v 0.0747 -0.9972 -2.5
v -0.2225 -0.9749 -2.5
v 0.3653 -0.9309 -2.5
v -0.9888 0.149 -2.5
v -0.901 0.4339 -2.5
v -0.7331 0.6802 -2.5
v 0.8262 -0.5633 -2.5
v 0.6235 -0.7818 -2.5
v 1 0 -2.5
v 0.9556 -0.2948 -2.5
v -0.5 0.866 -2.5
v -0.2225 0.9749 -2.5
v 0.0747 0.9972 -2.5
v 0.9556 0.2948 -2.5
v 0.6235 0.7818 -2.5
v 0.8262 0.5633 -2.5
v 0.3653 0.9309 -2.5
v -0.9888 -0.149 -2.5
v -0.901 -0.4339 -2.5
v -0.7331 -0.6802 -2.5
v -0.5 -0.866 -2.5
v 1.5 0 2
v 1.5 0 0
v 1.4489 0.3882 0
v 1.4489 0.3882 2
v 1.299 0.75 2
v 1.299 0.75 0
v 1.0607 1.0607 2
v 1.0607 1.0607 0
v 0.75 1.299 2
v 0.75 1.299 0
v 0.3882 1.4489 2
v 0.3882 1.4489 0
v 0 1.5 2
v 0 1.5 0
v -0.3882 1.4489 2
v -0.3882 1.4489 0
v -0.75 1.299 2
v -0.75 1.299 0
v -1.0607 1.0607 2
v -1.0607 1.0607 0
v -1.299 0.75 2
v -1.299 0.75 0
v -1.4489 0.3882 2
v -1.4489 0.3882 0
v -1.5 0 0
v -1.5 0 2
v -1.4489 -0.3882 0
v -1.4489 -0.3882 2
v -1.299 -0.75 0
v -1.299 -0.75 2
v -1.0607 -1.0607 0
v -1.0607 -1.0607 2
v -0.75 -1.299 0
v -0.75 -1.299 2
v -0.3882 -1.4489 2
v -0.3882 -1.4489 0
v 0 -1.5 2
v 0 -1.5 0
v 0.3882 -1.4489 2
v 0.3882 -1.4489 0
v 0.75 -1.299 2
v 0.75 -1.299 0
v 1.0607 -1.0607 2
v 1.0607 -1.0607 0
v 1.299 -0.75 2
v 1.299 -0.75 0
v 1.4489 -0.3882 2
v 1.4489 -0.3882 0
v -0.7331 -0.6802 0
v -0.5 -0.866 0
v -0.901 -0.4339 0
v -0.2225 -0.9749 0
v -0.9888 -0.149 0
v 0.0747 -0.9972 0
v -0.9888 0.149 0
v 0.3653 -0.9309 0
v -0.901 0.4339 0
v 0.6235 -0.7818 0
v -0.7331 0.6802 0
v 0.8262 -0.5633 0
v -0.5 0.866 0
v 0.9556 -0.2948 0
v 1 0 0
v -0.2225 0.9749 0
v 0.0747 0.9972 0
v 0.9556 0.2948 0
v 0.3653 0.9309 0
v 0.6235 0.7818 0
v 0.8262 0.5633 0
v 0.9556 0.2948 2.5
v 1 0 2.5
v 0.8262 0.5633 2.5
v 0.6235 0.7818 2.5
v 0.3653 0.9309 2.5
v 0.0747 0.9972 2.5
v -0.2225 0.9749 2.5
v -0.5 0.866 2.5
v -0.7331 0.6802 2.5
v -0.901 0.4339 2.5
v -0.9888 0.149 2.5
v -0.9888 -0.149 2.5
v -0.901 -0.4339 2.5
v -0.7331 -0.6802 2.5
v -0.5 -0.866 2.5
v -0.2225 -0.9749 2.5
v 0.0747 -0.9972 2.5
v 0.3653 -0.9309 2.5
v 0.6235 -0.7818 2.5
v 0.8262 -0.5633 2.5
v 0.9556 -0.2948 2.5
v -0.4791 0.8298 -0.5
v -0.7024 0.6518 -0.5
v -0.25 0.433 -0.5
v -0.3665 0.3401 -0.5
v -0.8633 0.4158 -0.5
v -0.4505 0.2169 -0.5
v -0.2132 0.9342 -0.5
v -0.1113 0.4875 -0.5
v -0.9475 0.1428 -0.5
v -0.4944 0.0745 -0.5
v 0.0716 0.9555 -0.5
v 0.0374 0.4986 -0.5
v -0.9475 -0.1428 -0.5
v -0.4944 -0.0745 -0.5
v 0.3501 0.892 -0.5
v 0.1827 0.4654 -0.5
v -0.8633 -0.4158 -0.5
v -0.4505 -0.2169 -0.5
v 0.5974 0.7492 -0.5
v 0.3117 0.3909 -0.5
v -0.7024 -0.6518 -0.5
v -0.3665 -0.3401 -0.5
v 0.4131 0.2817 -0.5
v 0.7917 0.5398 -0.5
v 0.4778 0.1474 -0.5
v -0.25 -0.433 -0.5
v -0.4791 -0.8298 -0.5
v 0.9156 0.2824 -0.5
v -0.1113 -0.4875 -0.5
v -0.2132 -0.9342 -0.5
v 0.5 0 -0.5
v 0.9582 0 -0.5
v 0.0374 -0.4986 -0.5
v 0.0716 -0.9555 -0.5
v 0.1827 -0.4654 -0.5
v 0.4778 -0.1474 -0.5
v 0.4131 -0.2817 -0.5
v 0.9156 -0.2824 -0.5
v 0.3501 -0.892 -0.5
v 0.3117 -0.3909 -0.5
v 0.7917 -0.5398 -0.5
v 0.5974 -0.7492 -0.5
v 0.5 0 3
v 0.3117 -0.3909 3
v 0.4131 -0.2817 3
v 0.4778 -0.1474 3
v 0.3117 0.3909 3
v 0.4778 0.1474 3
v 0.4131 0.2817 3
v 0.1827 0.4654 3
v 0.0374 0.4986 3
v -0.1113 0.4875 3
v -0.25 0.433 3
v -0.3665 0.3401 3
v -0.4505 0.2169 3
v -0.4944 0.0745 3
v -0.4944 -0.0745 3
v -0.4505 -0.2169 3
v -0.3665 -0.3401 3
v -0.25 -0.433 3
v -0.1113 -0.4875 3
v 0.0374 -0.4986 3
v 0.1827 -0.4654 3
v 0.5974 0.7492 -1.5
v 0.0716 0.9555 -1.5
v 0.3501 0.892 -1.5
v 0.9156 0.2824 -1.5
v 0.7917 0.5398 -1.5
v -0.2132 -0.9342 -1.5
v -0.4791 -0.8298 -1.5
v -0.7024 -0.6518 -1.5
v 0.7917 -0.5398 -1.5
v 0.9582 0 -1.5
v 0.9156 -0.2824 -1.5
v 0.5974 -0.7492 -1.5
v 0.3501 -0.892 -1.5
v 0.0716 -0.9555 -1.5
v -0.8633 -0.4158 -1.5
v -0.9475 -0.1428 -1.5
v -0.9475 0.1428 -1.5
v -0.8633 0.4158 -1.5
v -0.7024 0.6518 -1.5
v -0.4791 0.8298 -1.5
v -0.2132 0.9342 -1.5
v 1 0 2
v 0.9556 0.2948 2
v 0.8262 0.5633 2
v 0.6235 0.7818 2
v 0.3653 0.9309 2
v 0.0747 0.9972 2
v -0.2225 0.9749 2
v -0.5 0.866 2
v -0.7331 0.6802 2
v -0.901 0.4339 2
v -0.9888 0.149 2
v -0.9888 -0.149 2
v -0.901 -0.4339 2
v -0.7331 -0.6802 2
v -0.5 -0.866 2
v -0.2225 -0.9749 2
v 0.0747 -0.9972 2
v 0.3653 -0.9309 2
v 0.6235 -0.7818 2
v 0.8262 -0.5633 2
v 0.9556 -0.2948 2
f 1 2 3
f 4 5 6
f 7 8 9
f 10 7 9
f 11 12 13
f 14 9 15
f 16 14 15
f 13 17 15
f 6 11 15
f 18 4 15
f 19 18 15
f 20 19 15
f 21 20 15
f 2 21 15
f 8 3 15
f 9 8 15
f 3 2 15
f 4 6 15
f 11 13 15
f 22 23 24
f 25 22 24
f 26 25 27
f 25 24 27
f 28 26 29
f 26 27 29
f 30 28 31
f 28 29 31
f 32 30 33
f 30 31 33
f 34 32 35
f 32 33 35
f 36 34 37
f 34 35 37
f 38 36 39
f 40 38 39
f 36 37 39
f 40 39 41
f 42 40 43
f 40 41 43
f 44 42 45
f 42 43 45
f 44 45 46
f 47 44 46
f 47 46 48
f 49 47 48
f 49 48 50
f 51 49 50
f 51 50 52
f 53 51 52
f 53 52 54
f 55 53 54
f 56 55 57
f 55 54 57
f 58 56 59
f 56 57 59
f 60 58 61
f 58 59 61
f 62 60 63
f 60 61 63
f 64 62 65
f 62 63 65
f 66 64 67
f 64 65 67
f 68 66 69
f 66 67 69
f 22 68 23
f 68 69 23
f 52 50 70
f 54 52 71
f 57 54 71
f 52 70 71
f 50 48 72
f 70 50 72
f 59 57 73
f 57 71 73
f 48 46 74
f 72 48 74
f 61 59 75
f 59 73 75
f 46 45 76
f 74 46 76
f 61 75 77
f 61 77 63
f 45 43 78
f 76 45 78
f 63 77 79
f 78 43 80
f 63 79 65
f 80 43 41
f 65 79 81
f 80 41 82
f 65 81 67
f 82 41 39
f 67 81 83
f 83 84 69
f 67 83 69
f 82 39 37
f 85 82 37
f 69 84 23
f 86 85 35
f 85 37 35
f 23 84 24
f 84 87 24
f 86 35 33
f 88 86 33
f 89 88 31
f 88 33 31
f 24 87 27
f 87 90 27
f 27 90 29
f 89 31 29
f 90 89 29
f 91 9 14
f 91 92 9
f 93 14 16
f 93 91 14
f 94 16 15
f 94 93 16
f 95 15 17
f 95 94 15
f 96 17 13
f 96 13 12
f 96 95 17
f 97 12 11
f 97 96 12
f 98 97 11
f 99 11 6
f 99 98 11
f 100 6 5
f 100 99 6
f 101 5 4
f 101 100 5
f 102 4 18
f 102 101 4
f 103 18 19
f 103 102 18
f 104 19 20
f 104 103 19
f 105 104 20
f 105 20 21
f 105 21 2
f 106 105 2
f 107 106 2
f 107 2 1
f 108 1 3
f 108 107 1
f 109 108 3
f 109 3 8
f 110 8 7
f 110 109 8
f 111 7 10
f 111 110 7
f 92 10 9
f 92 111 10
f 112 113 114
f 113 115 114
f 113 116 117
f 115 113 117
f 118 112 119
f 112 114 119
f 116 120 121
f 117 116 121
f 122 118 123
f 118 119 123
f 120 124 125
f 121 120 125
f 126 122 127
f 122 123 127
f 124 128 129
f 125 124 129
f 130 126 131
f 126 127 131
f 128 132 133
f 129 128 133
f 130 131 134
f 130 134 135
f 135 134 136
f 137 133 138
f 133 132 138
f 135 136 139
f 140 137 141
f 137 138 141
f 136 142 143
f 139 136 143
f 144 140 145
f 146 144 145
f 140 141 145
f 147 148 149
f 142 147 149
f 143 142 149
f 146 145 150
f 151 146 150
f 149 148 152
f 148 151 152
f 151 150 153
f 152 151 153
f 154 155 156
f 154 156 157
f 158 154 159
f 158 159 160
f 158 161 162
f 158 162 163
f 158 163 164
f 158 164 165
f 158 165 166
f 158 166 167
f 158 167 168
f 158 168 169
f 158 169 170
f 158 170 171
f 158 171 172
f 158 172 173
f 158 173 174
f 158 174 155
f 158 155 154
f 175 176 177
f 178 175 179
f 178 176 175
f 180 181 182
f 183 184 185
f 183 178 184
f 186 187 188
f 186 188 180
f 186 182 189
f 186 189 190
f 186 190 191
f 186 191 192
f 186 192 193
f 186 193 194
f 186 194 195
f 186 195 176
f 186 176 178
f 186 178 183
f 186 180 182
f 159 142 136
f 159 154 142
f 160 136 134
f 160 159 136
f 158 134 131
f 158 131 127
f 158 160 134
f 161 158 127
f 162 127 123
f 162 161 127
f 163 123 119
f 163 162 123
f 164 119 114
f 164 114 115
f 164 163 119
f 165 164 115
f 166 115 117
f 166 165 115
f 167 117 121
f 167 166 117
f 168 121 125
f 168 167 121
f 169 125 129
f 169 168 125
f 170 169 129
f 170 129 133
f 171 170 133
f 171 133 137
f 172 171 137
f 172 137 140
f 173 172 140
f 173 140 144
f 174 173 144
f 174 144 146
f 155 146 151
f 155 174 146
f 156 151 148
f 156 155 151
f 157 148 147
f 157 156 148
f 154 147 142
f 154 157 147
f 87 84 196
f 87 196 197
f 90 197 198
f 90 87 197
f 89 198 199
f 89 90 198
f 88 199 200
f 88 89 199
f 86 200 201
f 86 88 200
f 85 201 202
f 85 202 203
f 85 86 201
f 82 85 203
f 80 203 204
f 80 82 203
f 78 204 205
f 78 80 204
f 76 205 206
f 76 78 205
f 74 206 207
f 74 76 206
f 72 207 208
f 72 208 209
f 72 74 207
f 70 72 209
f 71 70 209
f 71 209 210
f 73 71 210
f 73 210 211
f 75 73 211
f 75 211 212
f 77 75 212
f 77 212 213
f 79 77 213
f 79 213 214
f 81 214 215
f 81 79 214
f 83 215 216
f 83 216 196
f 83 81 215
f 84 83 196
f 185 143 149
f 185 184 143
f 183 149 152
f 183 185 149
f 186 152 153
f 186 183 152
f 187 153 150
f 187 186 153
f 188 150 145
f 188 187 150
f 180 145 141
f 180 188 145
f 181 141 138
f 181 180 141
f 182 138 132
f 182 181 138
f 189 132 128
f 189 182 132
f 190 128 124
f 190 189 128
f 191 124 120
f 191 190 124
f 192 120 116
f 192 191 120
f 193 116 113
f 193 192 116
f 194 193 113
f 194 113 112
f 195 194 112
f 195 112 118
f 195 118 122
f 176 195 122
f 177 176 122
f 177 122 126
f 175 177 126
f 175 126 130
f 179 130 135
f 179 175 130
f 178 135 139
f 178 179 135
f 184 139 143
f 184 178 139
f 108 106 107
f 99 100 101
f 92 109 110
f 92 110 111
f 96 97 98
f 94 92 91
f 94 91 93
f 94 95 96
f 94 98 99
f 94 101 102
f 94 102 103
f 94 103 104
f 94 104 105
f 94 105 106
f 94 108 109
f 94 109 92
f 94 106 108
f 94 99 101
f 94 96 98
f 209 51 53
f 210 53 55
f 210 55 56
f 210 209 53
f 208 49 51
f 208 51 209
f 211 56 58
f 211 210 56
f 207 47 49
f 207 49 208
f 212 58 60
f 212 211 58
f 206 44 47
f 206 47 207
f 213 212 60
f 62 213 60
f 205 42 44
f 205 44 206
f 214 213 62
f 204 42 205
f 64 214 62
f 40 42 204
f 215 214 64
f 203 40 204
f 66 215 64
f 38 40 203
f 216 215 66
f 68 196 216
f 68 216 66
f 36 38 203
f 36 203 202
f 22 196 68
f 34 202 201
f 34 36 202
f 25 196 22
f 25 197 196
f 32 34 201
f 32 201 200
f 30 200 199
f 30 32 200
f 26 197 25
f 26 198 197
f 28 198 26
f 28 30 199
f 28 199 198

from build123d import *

# Parameters (mm, degrees)
F0_R     = 0.5
F1_DEPTH = 3
F0_R_2   = 1.5
F0_R_3   = 1
F2_DEPTH = 2
F3_DEPTH = 1
F4_R     = 0.958214
F5_DEPTH = 0.5
F6_R     = 1
F7_DEPTH = 2.5


with BuildPart() as f1:
    # F0 (on Top) → F1 (new body)
    with BuildSketch(Plane.XY):
        Circle(F0_R)
    extrude(amount=F1_DEPTH)

    # F0 (on Top) → F3 (join)
    with BuildSketch(Plane.XY):
        Circle(F0_R)
    extrude(amount=-F3_DEPTH)

    # F4 (on face) → F5 (join, symmetric)
    with BuildSketch(Plane(origin=(0, 0, -1), x_dir=(1, 0, 0), z_dir=(0, 0, -1))):
        Circle(F4_R)
    extrude(amount=F5_DEPTH, both=True)


with BuildPart() as f2:
    # F0 (on Top) → F2 (new body)
    with BuildSketch(Plane.XY):
        Circle(F0_R_2)
        Circle(F0_R_3, mode=Mode.SUBTRACT)
    extrude(amount=F2_DEPTH)


with BuildPart() as f7:
    # F6 (on Top) → F7 (new body, symmetric)
    with BuildSketch(Plane.XY):
        Circle(F6_R)
    extrude(amount=F7_DEPTH, both=True)


solid = Compound([f1.part, f2.part, f7.part])
